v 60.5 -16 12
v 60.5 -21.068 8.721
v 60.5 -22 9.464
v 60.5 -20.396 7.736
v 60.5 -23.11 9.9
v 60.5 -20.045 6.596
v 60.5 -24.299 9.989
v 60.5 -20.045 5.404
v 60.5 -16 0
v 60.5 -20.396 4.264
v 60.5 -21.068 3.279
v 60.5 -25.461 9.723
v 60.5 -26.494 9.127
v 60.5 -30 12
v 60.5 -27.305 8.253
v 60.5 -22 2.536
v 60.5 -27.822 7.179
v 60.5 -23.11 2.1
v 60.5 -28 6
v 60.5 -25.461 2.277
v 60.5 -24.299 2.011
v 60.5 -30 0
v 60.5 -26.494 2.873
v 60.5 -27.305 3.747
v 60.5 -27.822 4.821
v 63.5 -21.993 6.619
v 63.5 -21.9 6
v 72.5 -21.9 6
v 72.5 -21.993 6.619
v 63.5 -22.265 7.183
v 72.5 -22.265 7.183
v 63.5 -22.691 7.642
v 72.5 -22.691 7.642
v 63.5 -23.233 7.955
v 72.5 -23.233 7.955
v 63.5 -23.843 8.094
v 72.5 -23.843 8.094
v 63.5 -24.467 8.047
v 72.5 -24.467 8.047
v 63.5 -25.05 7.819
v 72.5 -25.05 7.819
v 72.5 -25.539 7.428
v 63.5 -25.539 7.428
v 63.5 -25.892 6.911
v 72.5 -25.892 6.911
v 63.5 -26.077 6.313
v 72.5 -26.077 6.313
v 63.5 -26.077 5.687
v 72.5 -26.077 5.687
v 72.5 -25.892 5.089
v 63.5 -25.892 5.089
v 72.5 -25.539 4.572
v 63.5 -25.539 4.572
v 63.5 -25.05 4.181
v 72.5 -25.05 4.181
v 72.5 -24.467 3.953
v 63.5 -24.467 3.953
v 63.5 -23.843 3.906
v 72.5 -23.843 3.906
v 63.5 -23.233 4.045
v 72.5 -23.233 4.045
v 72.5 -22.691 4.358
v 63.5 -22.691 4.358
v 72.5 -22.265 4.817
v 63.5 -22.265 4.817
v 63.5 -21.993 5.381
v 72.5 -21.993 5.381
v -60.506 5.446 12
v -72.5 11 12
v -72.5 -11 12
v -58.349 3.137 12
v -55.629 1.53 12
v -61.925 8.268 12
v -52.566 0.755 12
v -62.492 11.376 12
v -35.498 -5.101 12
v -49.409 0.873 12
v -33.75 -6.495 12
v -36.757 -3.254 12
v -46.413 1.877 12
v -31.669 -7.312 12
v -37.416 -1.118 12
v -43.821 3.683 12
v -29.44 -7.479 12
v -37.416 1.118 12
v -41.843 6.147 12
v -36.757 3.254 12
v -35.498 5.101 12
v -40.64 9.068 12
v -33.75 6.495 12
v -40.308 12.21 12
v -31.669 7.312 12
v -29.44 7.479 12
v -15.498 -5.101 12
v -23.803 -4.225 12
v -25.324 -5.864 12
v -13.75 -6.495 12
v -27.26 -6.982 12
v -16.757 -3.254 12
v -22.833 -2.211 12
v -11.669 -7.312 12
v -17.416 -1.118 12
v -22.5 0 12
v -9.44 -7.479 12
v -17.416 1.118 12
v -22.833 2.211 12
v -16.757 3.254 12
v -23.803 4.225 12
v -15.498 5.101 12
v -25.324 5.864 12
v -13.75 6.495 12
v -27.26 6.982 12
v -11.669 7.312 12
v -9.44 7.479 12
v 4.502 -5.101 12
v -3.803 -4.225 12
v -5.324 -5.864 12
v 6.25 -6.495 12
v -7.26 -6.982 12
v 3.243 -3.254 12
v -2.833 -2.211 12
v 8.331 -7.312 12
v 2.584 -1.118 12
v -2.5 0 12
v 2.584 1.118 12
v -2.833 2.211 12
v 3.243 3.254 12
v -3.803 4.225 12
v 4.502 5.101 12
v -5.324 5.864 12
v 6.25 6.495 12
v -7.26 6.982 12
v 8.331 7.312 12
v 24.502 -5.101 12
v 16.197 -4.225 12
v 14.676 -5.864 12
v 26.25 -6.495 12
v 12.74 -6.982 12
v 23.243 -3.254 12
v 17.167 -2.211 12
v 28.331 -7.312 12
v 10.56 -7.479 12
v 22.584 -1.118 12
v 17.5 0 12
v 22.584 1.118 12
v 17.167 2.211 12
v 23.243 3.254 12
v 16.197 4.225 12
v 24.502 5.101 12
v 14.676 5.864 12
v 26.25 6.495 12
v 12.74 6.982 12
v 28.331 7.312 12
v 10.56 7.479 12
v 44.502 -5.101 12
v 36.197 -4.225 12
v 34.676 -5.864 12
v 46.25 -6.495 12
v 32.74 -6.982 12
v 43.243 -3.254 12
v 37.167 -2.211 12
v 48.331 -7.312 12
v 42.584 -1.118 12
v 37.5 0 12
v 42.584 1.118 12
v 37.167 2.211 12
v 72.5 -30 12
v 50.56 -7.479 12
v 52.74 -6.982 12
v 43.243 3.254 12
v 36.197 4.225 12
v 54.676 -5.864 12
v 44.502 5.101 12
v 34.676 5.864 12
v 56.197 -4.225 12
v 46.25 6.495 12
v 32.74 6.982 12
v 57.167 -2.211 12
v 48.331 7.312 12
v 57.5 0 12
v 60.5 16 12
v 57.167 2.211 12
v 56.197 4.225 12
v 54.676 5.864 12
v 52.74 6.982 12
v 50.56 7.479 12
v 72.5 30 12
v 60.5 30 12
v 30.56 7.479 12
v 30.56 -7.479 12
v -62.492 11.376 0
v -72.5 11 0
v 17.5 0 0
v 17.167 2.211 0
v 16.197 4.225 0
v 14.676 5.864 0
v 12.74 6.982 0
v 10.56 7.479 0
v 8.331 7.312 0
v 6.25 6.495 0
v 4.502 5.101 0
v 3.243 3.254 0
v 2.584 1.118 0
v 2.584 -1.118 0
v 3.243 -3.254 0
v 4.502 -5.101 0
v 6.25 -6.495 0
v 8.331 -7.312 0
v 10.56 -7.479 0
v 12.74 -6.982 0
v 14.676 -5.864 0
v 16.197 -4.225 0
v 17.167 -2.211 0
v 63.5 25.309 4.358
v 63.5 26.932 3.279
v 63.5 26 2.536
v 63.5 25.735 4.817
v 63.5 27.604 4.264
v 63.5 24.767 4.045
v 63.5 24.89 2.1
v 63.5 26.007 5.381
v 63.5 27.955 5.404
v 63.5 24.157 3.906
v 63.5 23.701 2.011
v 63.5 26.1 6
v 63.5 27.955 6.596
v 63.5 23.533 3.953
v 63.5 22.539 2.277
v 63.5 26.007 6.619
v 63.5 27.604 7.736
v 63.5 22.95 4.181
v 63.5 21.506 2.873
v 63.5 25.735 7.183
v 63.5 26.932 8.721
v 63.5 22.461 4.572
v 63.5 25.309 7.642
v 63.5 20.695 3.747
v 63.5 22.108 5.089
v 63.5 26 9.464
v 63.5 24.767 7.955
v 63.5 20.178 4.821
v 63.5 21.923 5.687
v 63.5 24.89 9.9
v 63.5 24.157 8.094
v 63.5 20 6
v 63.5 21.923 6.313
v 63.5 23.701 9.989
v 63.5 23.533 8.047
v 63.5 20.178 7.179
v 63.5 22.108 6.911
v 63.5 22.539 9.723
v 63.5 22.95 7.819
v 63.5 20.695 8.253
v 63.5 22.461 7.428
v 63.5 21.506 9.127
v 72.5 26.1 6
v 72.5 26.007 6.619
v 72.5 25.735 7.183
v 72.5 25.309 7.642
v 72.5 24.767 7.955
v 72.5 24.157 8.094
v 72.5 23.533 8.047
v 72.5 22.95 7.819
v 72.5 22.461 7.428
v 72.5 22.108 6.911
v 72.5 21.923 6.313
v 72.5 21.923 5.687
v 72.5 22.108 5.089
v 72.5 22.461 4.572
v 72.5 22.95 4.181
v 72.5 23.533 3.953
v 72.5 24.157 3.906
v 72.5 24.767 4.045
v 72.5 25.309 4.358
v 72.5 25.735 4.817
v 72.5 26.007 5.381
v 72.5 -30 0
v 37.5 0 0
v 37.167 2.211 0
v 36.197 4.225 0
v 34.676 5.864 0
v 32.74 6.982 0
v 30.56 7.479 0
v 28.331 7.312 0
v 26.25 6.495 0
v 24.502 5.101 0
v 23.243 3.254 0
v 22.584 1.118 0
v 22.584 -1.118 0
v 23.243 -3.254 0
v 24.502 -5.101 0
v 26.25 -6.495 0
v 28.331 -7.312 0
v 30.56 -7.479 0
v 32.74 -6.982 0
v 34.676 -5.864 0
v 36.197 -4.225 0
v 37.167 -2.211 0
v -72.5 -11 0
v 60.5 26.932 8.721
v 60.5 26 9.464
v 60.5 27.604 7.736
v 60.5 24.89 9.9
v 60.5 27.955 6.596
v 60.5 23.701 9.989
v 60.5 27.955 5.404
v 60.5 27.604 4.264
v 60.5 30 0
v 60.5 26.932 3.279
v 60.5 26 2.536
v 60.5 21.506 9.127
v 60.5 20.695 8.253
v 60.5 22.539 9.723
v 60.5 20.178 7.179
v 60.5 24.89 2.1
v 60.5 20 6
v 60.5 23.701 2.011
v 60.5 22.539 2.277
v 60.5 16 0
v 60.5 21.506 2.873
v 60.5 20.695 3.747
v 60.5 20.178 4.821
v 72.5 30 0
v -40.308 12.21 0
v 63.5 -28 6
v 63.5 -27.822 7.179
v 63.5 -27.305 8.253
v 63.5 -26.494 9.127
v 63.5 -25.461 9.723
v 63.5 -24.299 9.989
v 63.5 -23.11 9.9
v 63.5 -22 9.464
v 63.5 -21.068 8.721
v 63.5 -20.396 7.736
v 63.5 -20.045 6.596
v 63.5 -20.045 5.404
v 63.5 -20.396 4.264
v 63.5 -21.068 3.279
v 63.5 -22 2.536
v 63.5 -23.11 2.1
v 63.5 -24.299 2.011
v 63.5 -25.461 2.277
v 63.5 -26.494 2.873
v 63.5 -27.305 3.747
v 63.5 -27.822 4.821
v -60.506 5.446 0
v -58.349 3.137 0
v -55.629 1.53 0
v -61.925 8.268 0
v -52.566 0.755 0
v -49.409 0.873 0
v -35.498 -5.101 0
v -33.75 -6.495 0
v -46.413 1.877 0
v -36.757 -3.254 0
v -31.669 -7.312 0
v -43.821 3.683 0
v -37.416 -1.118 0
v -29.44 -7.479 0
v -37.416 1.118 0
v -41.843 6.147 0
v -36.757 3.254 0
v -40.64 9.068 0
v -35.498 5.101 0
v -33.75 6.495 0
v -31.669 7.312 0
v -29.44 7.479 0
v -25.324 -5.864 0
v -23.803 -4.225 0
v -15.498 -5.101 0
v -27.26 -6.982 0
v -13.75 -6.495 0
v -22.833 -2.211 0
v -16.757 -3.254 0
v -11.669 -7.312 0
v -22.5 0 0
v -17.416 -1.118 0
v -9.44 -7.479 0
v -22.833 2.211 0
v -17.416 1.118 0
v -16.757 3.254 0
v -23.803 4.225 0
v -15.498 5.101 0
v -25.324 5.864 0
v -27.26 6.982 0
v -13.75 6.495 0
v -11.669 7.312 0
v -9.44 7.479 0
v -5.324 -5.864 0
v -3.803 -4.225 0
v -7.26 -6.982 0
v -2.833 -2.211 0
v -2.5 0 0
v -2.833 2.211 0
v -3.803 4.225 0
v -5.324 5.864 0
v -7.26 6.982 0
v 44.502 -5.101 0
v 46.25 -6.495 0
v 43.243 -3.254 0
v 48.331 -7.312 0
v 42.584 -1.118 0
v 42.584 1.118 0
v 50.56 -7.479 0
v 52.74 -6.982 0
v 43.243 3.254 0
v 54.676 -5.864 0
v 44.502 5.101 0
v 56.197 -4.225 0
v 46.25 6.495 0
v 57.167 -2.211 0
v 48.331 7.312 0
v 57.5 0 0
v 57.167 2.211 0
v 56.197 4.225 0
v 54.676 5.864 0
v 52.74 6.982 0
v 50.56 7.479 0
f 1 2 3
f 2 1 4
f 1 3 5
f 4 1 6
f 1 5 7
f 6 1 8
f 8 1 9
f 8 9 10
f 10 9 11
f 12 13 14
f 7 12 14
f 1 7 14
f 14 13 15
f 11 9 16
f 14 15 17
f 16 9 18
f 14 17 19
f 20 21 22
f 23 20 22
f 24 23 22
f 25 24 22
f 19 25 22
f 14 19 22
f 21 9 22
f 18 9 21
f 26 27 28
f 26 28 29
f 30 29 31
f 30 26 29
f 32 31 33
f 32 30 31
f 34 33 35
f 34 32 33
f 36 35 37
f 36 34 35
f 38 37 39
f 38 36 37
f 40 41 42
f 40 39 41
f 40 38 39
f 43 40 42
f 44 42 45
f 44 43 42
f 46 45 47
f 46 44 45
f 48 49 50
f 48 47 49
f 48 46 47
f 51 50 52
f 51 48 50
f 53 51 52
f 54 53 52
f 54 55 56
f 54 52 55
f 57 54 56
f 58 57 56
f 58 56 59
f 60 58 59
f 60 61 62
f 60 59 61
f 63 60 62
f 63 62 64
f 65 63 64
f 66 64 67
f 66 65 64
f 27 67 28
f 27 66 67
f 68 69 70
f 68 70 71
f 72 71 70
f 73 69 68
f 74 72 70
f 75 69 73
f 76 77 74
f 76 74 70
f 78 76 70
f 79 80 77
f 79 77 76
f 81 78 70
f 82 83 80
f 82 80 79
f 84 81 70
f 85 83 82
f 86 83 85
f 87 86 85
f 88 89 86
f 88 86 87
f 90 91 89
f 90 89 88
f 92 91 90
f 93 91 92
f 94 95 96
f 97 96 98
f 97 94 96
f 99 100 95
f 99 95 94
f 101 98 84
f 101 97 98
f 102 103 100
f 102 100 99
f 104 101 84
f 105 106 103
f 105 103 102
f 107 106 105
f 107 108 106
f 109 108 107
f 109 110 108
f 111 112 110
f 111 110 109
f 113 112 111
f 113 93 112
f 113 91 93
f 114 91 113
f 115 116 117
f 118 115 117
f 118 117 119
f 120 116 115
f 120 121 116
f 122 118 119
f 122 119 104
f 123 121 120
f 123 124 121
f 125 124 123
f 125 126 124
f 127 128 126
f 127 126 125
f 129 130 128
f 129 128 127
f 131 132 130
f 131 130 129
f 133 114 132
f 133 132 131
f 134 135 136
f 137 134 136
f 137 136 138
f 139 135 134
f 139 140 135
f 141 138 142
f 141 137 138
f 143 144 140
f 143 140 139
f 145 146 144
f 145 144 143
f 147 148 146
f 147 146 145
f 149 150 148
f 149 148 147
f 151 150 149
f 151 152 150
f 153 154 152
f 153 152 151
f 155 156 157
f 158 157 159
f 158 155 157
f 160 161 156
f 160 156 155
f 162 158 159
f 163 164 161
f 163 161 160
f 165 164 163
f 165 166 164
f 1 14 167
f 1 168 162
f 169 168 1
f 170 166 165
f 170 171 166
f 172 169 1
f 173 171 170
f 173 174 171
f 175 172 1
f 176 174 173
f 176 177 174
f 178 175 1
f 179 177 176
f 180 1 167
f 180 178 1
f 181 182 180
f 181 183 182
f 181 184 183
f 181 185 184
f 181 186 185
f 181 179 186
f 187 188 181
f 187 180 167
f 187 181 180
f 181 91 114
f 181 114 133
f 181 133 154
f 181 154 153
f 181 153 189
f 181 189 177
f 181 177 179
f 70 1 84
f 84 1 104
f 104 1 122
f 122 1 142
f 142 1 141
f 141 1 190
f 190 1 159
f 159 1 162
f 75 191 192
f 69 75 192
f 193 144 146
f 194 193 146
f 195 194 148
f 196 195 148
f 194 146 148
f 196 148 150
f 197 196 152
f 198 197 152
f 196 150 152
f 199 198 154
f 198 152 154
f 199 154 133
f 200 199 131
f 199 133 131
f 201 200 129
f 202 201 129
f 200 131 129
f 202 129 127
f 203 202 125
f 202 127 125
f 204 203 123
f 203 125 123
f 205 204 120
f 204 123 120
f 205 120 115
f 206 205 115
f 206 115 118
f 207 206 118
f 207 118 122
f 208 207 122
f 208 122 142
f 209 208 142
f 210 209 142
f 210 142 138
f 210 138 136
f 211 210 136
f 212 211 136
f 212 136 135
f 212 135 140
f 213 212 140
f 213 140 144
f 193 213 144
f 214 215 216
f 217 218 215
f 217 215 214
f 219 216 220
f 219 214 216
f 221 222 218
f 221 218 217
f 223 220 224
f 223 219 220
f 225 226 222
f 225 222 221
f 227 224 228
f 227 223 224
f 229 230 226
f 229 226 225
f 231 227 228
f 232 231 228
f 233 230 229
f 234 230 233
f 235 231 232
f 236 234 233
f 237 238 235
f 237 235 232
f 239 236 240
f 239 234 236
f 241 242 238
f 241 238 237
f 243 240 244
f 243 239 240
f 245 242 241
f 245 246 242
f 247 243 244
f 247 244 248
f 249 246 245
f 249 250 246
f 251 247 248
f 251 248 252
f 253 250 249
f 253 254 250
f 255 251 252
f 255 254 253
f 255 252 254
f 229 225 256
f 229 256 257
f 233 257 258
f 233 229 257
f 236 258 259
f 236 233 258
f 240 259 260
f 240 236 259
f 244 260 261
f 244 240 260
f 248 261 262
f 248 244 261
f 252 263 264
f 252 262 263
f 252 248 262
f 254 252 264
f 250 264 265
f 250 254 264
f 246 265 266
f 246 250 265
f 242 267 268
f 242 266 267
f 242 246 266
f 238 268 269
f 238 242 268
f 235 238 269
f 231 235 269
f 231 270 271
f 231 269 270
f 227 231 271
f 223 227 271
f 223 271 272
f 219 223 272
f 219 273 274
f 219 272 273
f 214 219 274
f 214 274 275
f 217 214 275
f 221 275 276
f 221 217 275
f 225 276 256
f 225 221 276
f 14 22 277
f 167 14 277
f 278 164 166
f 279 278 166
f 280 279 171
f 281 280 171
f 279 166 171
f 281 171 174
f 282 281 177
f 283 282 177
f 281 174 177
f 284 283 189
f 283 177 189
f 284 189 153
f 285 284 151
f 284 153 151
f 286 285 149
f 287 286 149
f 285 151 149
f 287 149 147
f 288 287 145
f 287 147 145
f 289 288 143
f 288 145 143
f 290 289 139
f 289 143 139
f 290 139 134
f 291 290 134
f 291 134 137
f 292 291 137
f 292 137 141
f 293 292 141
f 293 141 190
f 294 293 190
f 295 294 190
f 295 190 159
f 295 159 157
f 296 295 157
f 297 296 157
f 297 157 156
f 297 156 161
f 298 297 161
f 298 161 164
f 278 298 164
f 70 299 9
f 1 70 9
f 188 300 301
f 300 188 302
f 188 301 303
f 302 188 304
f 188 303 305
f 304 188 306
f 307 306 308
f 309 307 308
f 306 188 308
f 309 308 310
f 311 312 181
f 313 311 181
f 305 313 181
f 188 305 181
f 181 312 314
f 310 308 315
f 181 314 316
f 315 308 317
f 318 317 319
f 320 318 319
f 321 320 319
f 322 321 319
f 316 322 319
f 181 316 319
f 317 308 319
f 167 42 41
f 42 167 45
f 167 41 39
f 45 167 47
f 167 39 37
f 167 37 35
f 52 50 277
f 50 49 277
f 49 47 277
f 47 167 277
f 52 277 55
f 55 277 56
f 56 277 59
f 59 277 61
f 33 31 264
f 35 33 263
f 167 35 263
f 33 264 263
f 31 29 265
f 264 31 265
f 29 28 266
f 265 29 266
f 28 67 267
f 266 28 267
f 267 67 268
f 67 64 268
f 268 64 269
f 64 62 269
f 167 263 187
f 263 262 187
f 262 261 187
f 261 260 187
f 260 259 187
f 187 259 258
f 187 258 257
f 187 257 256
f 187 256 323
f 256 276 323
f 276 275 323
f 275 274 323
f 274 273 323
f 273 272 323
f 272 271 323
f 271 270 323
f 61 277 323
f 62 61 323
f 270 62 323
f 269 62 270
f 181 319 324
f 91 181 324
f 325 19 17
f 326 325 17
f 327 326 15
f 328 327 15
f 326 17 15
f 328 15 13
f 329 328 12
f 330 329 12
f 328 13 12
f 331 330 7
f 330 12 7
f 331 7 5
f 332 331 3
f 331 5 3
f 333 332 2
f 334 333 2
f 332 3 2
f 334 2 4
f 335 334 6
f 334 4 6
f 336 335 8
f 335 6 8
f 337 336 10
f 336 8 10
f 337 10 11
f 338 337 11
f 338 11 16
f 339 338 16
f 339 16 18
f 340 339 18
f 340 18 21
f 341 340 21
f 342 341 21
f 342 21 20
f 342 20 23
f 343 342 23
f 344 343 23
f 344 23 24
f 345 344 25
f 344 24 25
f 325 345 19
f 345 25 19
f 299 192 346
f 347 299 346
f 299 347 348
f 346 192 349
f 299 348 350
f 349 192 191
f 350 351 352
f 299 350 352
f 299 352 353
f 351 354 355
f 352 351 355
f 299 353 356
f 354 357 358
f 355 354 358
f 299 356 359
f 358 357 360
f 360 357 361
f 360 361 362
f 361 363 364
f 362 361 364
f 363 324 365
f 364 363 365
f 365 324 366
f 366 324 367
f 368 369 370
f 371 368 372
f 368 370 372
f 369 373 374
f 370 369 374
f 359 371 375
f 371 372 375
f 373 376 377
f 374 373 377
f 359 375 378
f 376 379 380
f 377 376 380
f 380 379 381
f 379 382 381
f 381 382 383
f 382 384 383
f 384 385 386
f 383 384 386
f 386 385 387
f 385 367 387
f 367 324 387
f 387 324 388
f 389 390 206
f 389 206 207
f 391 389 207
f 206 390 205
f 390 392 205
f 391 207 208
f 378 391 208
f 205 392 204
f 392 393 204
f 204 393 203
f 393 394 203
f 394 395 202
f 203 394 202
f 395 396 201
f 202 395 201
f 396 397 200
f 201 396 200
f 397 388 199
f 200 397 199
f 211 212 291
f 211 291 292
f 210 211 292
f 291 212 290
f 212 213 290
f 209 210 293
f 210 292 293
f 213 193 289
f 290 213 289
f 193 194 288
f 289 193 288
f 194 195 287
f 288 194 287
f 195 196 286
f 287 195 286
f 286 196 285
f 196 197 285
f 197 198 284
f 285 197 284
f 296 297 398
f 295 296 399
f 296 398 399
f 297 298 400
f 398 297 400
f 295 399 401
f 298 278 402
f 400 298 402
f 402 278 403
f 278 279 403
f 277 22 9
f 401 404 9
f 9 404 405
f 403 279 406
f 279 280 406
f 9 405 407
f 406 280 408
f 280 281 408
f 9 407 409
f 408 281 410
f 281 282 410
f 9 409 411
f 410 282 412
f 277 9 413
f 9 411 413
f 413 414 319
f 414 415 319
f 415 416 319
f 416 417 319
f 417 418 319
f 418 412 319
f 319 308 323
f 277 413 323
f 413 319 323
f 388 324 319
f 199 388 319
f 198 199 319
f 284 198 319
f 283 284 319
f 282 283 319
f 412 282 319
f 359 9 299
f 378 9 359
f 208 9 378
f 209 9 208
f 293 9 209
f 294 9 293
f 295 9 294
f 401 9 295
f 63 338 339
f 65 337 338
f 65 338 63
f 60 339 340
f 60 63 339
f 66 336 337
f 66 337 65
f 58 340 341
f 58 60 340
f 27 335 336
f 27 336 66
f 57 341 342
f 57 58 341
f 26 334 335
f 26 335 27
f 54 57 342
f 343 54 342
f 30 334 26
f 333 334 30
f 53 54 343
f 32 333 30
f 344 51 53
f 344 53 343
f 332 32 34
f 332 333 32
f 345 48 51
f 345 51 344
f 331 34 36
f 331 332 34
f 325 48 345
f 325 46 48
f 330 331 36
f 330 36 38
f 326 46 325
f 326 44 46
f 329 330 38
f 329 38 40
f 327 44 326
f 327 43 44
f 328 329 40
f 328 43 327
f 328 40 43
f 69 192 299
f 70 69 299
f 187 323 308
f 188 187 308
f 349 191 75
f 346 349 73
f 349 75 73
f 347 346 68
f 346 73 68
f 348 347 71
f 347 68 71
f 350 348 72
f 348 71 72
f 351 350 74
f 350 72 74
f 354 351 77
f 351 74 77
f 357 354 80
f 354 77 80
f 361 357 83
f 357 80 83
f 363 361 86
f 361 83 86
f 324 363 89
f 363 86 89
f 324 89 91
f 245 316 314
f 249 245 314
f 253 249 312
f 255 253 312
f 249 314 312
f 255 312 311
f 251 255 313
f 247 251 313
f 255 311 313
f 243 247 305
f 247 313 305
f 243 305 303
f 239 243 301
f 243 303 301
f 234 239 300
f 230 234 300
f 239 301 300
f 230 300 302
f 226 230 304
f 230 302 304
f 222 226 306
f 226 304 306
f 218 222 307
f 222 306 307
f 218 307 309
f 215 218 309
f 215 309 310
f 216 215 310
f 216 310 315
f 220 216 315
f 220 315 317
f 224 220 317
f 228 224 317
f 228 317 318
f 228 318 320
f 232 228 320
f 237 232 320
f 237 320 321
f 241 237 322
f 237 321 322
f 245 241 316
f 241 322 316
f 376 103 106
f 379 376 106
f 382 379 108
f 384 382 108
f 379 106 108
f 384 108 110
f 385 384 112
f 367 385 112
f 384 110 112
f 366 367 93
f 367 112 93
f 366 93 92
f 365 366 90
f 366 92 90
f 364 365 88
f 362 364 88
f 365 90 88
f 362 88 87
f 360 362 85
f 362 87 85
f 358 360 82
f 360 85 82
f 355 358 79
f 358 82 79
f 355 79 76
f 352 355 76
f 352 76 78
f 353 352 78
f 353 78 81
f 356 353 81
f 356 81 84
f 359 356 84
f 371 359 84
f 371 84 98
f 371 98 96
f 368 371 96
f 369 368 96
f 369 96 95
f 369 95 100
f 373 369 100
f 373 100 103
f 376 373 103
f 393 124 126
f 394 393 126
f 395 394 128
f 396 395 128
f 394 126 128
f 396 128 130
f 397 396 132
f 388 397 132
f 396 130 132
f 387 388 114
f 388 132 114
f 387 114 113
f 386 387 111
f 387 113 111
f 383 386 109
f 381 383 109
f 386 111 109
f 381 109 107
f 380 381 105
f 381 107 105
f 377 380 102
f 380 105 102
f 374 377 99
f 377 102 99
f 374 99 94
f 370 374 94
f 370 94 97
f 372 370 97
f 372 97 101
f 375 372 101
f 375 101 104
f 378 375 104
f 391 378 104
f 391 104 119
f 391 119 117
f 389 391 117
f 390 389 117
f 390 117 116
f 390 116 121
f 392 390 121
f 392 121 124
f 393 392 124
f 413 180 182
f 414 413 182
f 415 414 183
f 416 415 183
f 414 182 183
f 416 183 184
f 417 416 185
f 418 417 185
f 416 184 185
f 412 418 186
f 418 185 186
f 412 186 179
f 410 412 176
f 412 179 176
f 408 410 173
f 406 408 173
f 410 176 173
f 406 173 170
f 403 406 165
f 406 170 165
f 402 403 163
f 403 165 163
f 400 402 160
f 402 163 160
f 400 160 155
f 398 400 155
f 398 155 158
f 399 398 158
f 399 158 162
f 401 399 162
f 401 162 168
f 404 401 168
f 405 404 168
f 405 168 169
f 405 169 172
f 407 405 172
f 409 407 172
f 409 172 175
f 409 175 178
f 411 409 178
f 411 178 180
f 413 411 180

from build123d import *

# Parameters (mm, degrees)
F1_DEPTH  = 12
F2_R      = 11.1
F3_DEPTH  = 12.001
F5_R      = 2.1
F6_DEPTH  = 12.001
F7_R      = 4
F8_DEPTH  = 3
F9_R      = 4
F10_DEPTH = 3
F11_R     = 7.5
F12_DEPTH = 12.001


with BuildPart() as f1:
    # F0 (on Top) → F1 (new body)
    with BuildSketch(Plane.XY):
        Polygon((60.5, -30), (72.5, -30), (72.5, 30), (60.5, 30), (60.5, 16), (60.5, -16), align=None)
        Polygon((-72.5, -11), (60.5, -16), (60.5, 16), (-72.5, 11), align=None)
    extrude(amount=F1_DEPTH)

    # F2 (on face) → F3 (cut, through all)
    with BuildSketch(Plane.XY.offset(12)):
        with Locations((-51.4, 11.793233)):
            Circle(F2_R)
    extrude(amount=-F3_DEPTH, mode=Mode.SUBTRACT)

    # F5 (on offset) → F6 (cut, through all)
    with BuildSketch(Plane.YZ.offset(60.5)):
        with Locations((24, 6)):
            Circle(F5_R)
        with Locations((-24, 6)):
            Circle(F5_R)
    extrude(amount=F6_DEPTH, mode=Mode.SUBTRACT)

    # F7 (on face) → F8 (cut)
    with BuildSketch(Plane(origin=(60.5, 0, 0), x_dir=(0, -1, 0), z_dir=(-1, 0, 0))):
        with Locations((-24, 6)):
            Circle(F7_R)
    extrude(amount=-F8_DEPTH, mode=Mode.SUBTRACT)

    # F9 (on face) → F10 (cut)
    with BuildSketch(Plane(origin=(60.5, 0, 0), x_dir=(0, -1, 0), z_dir=(-1, 0, 0))):
        with Locations((24, 6)):
            Circle(F9_R)
    extrude(amount=-F10_DEPTH, mode=Mode.SUBTRACT)

    # F11 (on face) → F12 (cut, through all)
    with BuildSketch(Plane.XY.offset(12)):
        with Locations((-30, 0)):
            Circle(F11_R)
        with Locations((-10, 0)):
            Circle(F11_R)
        with Locations((10, 0)):
            Circle(F11_R)
        with Locations((30, 0)):
            Circle(F11_R)
        with Locations((50, 0)):
            Circle(F11_R)
    extrude(amount=-F12_DEPTH, mode=Mode.SUBTRACT)


solid = f1.part
